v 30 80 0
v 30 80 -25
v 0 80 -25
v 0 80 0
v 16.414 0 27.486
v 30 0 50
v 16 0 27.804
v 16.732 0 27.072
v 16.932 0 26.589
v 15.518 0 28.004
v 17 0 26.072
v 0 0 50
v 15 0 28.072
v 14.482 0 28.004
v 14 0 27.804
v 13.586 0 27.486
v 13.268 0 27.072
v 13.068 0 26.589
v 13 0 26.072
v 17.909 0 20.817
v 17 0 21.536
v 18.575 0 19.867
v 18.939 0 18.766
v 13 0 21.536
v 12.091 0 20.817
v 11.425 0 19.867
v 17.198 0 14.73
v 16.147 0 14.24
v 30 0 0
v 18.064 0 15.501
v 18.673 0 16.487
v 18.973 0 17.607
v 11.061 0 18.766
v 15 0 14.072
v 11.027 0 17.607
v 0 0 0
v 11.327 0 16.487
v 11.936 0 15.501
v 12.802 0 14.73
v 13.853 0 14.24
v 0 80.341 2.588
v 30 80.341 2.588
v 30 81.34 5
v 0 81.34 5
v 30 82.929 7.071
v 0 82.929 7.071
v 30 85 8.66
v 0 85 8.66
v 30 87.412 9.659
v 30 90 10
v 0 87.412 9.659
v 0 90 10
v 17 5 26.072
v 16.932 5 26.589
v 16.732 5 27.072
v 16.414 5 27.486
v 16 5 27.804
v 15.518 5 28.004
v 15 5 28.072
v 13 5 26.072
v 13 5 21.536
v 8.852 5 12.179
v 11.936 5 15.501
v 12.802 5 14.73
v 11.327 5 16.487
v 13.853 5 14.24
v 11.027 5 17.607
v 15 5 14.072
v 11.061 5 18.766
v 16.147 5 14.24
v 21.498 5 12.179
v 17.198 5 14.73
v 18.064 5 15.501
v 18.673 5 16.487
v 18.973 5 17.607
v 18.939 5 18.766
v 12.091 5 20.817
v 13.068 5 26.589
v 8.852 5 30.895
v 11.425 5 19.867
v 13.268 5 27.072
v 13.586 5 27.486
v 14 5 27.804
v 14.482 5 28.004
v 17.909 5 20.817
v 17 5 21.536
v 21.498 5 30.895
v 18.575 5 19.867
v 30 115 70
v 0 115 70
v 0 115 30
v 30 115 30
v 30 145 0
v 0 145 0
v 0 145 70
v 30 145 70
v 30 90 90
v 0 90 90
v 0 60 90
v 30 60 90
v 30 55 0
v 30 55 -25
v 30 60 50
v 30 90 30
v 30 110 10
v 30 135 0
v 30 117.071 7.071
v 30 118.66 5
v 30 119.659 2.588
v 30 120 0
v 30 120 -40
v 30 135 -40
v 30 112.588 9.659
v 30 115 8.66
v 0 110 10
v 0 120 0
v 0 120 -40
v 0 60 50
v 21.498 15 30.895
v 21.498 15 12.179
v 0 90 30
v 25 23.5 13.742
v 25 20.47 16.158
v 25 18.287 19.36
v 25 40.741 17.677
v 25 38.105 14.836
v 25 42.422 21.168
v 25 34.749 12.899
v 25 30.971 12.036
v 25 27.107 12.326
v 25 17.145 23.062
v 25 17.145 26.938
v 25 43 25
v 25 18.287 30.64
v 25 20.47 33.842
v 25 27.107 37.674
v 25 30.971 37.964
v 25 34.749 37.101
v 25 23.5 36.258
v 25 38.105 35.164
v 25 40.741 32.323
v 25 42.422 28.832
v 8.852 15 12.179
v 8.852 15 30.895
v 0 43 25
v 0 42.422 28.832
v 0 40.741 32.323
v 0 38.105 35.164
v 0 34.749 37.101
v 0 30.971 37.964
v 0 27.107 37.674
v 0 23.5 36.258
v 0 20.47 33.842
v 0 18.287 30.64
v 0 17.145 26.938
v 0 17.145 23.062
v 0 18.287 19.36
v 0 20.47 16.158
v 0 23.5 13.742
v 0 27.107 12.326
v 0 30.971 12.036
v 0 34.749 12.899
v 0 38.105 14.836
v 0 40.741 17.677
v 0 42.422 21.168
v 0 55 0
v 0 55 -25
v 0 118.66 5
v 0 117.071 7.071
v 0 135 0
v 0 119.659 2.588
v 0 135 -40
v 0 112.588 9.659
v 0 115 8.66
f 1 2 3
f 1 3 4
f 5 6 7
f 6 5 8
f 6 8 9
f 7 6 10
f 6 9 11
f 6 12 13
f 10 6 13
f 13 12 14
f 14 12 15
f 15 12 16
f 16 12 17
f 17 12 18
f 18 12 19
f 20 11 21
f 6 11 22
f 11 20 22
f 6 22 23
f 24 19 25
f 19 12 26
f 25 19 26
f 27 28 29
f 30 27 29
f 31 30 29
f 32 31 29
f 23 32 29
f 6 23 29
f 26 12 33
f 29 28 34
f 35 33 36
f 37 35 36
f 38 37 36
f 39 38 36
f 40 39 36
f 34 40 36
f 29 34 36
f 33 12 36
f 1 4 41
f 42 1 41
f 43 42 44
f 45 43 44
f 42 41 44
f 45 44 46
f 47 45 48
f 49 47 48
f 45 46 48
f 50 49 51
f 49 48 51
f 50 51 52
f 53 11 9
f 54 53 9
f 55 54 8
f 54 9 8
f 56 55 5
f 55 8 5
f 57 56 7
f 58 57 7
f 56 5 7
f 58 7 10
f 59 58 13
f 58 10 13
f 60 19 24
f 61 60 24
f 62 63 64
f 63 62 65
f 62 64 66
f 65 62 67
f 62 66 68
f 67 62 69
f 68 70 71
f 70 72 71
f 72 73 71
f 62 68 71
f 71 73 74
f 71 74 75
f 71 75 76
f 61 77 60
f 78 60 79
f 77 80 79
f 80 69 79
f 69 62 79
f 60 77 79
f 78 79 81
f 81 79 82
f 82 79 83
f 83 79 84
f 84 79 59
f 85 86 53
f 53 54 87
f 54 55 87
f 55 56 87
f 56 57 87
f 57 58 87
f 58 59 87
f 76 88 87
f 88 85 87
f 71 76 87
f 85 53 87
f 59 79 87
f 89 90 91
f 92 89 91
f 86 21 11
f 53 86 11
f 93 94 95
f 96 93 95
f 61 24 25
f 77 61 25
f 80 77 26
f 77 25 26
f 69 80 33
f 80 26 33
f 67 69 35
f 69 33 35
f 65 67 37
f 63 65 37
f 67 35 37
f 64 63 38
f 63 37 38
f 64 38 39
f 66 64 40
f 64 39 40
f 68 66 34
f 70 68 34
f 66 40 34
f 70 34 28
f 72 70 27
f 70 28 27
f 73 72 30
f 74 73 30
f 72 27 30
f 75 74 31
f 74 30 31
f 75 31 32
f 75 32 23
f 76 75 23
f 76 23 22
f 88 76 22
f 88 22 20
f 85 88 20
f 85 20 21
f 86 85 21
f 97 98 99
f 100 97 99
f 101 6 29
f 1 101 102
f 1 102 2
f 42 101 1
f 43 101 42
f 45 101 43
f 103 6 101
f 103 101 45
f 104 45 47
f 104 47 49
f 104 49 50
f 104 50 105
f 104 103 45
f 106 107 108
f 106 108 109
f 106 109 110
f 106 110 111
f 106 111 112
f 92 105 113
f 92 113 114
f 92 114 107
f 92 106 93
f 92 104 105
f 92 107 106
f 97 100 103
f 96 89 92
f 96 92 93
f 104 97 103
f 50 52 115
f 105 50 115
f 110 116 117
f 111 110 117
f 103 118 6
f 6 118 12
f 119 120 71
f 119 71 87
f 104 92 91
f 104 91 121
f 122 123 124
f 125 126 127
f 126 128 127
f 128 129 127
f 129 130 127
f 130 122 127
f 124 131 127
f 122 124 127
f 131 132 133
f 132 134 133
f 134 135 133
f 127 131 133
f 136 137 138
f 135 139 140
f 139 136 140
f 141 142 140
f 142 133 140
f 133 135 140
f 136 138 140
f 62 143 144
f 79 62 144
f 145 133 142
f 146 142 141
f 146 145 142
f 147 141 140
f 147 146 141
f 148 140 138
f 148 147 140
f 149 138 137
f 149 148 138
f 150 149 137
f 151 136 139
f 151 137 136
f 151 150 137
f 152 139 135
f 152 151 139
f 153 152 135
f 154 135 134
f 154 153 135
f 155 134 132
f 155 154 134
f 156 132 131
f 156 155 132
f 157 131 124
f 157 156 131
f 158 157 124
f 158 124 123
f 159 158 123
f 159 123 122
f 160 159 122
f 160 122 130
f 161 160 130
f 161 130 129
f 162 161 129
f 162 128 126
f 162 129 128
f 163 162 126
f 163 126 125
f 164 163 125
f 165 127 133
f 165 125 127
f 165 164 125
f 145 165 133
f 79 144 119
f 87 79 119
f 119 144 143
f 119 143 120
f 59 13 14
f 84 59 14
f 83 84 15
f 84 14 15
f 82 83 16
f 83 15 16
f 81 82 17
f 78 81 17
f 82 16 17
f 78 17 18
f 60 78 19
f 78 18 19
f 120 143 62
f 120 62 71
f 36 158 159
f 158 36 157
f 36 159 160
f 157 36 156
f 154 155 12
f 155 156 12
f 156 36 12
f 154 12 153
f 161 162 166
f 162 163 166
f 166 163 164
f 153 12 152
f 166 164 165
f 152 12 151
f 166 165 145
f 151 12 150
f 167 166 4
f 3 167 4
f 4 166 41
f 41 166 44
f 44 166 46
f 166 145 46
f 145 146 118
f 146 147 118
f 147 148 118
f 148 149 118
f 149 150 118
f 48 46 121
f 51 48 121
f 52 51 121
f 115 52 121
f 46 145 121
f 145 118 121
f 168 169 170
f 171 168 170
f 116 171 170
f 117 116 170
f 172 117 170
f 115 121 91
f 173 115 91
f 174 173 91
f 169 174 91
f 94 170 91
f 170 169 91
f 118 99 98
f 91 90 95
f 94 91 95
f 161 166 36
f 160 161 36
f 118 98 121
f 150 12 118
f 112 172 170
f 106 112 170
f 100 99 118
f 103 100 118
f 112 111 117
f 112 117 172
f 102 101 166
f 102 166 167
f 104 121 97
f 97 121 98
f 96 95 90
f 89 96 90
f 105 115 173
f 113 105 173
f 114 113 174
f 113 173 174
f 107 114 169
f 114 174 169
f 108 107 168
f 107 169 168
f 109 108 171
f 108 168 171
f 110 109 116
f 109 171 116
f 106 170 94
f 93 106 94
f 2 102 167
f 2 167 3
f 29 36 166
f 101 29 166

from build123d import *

# Parameters (mm, degrees)
F0_R     = 13
F1_DEPTH = 30
F2_W     = 55
F2_H     = 50
F3_DEPTH = 5
F5_DEPTH = 15
F6_W     = 12.6459868625
F6_H     = 18.7160577625
F7_DEPTH = 10


with BuildPart() as f1:
    # F0 (on Right) → F1 (new body)
    with BuildSketch(Plane.YZ):
        with BuildLine():
            Line((0, 50), (0, 0))
            Line((0, 0), (55, 0))
            Line((55, 0), (55, -25))
            Line((55, -25), (80, -25))
            Line((80, -25), (80, 0))
            ThreePointArc((80, 0), (82.9289321881, 7.0710678119), (90, 10))
            Line((90, 10), (110, 10))
            ThreePointArc((110, 10), (117.0710678119, 7.0710678119), (120, 0))
            Line((120, 0), (120, -40))
            Line((120, -40), (135, -40))
            Line((135, -40), (135, 0))
            Line((135, 0), (145, 0))
            Line((145, 0), (145, 70))
            Line((145, 70), (115, 70))
            Line((115, 70), (115, 30))
            Line((115, 30), (90, 30))
            Line((90, 30), (90, 90))
            Line((90, 90), (60, 90))
            Line((60, 90), (60, 50))
            Line((60, 50), (0, 50))
        make_face()
        with Locations((30, 25)):
            Circle(F0_R, mode=Mode.SUBTRACT)
    extrude(amount=F1_DEPTH)

    # F2 (on face) → F3 (join)
    with BuildSketch(Plane.YZ.offset(30)):
        with Locations((27.5, 25)):
            Rectangle(F2_W, F2_H)
    extrude(amount=-F3_DEPTH)

    # F4 (on face) → F5 (cut)
    with BuildSketch(Plane.XZ):
        with BuildLine():
            Line((13, 26.0717967697), (13, 21.5358983849))
            ThreePointArc((13, 21.5358983849), (15, 14.0717967697), (17, 21.5358983849))
            Line((17, 21.5358983849), (17, 26.0717967697))
            ThreePointArc((17, 26.0717967697), (16.4142135624, 27.4860103321), (15, 28.0717967697))
            ThreePointArc((15, 28.0717967697), (13.5857864376, 27.4860103321), (13, 26.0717967697))
        make_face()
    extrude(amount=-F5_DEPTH, mode=Mode.SUBTRACT)

    # F6 (on face) → F7 (cut)
    with BuildSketch(Plane.XZ.offset(-15)):
        with Locations((15.175185632, 21.5370440856)):
            Rectangle(F6_W, F6_H)
    extrude(amount=F7_DEPTH, mode=Mode.SUBTRACT)


solid = f1.part
